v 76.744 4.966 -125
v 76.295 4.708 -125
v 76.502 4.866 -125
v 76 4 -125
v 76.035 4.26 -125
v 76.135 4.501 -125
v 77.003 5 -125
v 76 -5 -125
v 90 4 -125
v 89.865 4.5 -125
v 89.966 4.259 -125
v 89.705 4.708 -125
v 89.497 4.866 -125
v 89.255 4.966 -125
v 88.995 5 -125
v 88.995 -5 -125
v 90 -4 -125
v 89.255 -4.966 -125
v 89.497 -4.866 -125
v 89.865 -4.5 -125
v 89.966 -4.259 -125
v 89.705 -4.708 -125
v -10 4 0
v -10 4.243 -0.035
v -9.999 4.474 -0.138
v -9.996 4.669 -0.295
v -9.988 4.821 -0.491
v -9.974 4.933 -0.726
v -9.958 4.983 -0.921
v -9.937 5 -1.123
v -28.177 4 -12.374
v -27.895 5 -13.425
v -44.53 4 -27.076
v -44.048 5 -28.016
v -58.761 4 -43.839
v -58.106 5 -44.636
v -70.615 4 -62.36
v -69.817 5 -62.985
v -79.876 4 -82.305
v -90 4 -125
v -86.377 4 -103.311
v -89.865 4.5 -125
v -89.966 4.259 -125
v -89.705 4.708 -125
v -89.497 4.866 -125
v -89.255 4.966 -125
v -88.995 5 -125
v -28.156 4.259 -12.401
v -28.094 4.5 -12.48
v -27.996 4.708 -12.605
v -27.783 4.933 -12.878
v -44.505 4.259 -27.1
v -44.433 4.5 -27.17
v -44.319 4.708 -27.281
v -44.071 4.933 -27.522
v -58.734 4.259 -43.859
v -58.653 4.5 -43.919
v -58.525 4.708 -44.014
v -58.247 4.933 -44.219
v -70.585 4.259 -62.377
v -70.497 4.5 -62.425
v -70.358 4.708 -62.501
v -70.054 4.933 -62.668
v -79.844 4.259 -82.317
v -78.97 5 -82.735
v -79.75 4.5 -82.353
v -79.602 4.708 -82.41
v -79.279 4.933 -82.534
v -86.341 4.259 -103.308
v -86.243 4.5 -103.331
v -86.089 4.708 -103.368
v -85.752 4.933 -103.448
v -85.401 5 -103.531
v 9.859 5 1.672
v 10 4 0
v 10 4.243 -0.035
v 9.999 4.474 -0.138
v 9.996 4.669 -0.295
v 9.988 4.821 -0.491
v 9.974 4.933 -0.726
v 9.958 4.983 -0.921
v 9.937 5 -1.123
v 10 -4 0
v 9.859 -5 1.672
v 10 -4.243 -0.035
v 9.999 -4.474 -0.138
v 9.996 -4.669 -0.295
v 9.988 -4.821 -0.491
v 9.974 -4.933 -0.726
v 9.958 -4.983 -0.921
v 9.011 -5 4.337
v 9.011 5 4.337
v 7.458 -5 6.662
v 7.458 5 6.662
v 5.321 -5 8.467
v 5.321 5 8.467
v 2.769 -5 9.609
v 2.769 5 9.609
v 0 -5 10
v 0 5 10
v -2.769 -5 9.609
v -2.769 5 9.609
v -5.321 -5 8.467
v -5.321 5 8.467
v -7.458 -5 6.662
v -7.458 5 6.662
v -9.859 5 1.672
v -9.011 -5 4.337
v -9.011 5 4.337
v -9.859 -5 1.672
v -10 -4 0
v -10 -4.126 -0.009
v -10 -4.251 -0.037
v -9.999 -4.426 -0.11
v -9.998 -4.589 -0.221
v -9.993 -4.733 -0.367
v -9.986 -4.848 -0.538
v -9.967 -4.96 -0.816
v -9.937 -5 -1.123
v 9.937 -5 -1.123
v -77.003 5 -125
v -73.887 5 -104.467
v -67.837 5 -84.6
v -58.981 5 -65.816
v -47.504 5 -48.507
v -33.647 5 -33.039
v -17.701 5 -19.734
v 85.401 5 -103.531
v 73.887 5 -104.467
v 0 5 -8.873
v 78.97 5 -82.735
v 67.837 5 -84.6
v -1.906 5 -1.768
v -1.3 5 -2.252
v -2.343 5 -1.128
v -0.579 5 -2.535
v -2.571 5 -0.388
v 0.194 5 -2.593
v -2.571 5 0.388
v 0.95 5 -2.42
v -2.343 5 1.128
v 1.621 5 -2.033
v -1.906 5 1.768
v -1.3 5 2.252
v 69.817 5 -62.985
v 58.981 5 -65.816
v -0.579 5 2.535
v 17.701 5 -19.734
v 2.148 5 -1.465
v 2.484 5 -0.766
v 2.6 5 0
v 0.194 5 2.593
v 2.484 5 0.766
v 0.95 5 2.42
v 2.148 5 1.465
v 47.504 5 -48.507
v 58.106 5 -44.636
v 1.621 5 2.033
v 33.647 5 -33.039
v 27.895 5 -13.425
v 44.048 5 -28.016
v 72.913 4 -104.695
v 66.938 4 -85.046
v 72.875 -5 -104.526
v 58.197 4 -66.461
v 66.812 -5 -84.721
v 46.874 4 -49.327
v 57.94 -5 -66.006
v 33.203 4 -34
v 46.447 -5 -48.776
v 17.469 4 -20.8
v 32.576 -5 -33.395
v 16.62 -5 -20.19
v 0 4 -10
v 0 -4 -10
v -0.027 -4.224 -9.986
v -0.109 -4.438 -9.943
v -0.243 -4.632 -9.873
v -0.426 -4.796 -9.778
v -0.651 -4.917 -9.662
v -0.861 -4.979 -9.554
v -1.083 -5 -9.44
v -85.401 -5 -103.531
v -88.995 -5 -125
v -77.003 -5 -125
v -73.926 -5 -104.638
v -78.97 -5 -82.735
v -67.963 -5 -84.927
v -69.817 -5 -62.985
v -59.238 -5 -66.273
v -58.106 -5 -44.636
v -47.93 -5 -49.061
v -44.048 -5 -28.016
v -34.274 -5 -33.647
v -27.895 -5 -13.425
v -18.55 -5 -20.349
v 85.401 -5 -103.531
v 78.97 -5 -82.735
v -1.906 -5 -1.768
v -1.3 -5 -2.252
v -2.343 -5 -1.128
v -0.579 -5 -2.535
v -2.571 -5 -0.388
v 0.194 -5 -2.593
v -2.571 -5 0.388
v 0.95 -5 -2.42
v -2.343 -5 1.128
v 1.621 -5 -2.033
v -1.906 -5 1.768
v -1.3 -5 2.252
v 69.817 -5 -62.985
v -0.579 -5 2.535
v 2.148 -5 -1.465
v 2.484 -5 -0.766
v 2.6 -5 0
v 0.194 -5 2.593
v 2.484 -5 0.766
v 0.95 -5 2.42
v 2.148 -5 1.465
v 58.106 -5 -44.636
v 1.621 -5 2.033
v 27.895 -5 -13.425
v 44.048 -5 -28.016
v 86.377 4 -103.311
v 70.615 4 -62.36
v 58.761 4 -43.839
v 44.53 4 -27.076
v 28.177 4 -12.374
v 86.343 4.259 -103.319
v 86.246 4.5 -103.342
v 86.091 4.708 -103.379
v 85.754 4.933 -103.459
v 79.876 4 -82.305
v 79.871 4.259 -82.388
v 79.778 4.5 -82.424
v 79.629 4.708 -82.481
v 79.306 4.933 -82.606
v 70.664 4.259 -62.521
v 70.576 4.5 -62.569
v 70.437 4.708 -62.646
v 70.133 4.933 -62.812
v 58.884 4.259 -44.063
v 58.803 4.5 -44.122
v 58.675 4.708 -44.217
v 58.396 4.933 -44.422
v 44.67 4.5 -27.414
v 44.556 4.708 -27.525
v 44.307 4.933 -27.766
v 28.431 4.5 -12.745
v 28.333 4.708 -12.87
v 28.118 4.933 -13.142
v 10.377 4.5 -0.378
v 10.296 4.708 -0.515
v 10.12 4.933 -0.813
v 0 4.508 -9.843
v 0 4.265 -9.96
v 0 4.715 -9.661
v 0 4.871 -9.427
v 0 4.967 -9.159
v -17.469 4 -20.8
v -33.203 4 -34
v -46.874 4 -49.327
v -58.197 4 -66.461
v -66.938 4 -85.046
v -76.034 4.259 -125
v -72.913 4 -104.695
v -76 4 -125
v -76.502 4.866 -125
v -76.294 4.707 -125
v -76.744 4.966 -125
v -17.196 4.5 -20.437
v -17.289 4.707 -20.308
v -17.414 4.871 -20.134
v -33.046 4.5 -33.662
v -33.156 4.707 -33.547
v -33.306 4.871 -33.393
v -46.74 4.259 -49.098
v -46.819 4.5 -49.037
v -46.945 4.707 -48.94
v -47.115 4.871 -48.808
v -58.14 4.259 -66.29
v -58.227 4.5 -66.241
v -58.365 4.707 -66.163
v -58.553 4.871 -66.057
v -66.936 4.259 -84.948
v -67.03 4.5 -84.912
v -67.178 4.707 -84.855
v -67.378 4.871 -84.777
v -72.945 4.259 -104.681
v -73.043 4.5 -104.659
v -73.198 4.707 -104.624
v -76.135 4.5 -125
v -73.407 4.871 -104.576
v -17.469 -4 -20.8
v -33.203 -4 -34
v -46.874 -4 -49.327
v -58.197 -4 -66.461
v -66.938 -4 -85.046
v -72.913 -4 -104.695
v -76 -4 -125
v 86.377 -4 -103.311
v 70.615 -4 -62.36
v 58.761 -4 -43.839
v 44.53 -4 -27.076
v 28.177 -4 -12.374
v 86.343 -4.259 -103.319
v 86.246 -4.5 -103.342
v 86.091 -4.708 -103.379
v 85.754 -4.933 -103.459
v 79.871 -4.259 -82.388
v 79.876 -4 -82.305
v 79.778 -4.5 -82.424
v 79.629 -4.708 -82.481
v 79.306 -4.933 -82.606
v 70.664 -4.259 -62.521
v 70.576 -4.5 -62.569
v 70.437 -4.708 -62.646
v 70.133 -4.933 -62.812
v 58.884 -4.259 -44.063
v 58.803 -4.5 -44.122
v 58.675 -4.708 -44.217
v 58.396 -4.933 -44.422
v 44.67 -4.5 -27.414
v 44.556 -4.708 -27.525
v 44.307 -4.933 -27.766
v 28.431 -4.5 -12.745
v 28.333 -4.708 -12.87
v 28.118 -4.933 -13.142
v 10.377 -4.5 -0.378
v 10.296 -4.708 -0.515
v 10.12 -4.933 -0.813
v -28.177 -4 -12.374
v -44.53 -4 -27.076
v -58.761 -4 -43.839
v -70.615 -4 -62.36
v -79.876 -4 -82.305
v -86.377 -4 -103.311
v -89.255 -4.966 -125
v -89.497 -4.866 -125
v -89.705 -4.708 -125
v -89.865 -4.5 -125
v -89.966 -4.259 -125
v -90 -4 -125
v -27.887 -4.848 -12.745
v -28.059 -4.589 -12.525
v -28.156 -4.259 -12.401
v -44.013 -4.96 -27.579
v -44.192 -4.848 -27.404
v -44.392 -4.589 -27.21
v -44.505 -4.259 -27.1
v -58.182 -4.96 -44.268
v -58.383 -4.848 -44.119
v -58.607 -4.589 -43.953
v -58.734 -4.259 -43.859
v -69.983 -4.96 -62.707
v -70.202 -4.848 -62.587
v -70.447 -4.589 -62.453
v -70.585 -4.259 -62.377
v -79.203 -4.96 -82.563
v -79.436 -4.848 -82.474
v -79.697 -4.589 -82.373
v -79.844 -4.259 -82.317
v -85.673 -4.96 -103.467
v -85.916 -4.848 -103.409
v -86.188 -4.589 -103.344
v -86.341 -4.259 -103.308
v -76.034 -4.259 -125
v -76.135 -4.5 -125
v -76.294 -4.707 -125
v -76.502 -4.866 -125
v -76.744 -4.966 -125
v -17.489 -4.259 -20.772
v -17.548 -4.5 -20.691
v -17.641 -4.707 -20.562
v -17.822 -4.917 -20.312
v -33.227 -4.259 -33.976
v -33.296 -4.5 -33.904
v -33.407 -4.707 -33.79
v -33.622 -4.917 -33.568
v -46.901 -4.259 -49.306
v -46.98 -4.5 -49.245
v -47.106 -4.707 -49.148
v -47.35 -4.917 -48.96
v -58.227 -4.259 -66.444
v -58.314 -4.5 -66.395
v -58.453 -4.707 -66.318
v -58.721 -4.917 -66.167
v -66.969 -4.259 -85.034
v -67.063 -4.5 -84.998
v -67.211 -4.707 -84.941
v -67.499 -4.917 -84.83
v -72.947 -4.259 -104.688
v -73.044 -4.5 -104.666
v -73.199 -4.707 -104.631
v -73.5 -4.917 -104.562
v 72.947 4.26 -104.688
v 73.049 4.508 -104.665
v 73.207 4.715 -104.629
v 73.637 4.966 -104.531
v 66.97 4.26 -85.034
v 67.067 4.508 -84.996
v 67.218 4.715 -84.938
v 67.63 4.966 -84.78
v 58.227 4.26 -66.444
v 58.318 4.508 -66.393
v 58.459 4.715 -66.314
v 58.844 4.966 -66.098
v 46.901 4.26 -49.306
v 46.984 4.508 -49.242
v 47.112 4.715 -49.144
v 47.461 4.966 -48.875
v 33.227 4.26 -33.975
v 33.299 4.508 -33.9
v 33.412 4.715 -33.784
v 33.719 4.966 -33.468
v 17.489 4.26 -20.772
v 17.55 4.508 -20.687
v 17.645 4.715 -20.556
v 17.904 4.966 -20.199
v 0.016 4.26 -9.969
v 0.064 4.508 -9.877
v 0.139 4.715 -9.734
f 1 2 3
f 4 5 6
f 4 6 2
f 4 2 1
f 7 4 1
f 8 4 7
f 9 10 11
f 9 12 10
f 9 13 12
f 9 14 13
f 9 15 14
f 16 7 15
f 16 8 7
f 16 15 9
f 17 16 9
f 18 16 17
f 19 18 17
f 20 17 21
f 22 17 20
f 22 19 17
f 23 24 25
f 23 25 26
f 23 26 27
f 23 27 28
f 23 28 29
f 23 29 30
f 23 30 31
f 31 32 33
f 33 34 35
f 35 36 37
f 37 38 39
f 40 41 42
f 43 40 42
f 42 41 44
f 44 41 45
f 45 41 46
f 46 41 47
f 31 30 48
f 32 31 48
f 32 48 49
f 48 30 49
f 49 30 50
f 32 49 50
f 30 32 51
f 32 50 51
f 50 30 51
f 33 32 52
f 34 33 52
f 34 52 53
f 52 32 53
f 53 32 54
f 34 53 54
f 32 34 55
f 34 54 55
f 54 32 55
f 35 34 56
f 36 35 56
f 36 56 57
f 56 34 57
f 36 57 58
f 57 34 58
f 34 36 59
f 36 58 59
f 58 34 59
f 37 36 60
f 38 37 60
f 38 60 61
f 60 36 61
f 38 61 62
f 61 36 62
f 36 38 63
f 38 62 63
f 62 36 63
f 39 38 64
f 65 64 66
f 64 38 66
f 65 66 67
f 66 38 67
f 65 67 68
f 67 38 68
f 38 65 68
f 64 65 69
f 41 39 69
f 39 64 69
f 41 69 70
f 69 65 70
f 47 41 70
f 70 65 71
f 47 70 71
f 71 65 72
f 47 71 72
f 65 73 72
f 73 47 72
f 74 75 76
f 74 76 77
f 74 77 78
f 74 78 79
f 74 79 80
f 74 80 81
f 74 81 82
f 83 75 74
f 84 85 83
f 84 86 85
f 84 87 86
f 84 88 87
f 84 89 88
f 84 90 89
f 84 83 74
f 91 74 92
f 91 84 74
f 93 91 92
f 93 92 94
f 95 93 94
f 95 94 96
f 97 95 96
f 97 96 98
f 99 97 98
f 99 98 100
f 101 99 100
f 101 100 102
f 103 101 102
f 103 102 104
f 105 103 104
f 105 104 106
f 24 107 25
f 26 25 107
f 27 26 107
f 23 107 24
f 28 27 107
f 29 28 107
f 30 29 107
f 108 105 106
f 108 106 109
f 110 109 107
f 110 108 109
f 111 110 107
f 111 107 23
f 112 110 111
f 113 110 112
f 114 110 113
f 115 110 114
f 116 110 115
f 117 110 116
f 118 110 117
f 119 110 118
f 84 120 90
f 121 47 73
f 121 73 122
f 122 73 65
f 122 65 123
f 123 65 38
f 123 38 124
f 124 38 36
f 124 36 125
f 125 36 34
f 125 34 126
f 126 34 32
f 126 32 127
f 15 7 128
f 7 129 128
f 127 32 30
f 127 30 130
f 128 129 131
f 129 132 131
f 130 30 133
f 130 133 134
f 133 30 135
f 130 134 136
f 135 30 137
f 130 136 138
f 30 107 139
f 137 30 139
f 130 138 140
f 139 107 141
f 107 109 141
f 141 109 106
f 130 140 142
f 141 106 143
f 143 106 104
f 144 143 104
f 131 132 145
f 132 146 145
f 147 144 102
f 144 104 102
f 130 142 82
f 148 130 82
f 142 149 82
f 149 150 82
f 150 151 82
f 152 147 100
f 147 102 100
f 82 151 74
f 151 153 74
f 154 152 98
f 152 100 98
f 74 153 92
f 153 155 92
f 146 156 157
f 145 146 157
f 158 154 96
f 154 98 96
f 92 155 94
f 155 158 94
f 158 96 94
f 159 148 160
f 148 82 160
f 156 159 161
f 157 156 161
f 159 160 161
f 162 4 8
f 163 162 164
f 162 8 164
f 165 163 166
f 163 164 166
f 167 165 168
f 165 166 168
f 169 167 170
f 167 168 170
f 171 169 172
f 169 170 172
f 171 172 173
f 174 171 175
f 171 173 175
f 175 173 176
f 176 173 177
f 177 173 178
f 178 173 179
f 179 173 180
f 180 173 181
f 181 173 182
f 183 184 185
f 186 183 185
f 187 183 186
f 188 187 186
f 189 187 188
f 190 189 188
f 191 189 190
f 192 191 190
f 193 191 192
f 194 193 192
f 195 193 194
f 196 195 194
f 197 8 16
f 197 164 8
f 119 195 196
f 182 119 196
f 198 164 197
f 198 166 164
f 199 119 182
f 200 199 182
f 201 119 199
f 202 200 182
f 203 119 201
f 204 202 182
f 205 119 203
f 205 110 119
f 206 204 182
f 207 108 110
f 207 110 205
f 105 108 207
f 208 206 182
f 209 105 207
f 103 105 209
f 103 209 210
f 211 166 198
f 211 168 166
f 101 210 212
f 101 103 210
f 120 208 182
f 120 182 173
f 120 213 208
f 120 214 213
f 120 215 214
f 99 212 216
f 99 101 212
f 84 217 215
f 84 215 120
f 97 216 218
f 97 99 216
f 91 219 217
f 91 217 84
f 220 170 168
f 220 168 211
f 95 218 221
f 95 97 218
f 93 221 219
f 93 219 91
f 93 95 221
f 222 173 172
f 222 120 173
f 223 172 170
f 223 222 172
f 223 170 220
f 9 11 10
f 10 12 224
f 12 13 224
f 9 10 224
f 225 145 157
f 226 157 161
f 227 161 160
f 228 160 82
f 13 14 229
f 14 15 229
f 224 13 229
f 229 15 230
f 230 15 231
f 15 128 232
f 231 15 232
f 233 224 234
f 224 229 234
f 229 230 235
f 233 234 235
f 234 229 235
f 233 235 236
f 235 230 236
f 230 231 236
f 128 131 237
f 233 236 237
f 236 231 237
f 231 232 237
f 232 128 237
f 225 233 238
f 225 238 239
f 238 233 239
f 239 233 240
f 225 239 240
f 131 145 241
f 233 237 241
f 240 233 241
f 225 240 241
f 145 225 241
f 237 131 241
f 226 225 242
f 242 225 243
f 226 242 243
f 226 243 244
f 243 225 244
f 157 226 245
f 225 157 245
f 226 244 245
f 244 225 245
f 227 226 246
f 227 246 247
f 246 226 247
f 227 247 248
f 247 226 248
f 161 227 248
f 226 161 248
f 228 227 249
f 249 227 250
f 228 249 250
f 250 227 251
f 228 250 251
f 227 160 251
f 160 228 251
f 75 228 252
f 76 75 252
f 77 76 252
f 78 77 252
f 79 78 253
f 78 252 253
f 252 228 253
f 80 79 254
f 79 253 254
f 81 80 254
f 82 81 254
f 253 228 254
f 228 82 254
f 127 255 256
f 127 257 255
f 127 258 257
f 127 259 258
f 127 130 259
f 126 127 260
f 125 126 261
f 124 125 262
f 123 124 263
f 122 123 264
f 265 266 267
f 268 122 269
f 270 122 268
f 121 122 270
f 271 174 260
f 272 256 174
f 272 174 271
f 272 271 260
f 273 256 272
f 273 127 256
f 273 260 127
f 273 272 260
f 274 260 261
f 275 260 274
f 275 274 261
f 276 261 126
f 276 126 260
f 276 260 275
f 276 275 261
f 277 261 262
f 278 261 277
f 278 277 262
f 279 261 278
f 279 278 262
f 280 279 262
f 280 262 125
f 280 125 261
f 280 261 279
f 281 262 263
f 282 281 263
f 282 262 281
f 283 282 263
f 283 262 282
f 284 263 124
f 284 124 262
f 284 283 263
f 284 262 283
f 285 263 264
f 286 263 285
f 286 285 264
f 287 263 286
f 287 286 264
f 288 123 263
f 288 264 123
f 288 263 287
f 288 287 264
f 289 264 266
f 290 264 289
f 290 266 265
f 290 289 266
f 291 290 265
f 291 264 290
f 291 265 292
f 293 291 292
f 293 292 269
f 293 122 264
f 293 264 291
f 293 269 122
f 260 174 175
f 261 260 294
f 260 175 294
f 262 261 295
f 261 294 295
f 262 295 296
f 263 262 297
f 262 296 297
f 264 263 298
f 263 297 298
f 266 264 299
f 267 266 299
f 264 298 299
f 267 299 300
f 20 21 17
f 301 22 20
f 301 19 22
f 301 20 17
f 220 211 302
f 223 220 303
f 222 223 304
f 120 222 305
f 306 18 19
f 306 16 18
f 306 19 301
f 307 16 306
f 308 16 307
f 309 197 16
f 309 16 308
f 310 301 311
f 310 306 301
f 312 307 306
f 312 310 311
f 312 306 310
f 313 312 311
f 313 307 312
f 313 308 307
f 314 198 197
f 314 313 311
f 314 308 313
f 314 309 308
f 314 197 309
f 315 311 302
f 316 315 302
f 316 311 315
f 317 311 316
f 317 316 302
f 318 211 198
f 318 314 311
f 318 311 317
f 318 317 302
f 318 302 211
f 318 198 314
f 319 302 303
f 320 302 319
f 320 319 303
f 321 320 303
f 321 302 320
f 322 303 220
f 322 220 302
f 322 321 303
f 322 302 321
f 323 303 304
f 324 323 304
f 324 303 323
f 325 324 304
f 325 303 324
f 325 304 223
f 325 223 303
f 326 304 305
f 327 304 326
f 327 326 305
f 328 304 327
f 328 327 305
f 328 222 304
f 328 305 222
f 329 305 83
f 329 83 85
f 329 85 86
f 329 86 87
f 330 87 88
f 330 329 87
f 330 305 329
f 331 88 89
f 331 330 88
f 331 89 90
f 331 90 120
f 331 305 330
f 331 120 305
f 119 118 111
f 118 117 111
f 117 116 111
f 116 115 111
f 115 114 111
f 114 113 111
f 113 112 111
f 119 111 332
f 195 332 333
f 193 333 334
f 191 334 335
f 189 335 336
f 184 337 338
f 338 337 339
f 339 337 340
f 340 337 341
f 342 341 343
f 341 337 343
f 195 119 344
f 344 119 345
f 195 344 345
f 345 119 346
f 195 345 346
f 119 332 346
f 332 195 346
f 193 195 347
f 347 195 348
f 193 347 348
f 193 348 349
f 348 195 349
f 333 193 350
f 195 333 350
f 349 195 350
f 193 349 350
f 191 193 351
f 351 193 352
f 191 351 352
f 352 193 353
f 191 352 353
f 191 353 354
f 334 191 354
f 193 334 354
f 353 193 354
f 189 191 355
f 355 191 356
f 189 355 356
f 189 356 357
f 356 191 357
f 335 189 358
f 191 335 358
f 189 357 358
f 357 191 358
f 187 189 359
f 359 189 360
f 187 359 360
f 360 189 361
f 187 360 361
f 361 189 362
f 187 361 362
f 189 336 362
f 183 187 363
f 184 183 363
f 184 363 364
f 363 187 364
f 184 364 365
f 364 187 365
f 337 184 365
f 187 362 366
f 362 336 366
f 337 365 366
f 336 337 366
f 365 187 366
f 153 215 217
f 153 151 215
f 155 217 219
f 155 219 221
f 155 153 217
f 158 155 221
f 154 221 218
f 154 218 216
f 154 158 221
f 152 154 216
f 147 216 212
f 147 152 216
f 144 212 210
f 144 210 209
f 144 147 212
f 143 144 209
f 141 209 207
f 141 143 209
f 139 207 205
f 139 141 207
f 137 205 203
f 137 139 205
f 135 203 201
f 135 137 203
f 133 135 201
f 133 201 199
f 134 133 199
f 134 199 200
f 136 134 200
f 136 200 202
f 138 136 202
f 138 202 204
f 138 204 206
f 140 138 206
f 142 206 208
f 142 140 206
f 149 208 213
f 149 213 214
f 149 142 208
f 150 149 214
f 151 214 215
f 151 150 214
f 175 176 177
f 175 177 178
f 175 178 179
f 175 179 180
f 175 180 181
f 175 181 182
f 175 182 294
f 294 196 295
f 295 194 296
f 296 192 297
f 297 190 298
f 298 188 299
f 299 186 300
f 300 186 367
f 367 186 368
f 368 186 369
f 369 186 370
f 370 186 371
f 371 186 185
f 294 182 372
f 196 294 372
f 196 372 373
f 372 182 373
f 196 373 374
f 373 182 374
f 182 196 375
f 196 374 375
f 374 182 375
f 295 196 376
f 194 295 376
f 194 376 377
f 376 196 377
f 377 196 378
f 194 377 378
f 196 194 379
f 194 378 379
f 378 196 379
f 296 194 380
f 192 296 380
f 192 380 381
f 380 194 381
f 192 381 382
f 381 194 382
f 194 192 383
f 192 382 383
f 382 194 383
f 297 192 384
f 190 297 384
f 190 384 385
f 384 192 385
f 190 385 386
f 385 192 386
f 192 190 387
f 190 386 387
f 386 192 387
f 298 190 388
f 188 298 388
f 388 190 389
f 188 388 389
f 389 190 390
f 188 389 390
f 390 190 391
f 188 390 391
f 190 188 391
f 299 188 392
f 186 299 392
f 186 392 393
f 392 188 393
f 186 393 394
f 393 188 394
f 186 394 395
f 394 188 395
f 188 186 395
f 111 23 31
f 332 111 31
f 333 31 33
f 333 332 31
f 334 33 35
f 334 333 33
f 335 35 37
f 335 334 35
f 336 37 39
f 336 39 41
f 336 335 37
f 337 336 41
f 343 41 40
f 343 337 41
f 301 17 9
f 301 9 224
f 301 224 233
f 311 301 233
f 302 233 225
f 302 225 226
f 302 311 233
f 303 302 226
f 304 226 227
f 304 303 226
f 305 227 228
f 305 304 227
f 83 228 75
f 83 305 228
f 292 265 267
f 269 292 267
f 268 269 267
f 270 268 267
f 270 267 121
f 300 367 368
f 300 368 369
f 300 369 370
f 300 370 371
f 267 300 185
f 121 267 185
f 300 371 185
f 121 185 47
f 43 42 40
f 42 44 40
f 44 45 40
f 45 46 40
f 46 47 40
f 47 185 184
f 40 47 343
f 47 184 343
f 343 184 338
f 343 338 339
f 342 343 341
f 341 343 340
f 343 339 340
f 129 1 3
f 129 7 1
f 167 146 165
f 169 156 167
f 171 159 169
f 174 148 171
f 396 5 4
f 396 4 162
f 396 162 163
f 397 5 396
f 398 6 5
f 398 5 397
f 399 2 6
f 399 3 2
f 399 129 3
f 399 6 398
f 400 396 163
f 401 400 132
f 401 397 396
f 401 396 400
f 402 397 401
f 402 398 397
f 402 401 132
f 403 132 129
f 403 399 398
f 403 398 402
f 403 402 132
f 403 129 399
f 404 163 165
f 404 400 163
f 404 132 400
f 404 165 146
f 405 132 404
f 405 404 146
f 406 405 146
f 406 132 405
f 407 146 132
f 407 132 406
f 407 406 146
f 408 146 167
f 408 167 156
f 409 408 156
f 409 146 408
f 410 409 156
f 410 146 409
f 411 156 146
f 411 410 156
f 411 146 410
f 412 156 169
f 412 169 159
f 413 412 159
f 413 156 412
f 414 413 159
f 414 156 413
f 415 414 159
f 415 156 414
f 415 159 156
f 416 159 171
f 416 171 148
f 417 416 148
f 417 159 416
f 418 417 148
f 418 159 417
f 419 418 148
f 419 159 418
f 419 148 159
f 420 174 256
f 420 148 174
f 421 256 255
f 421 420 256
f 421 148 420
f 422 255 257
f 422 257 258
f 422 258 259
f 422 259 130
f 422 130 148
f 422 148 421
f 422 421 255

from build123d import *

# Parameters (mm, degrees)
SKETCH_R      = 2.6
EXTRUDE_DEPTH = 5
FILLET_R      = 1


with BuildPart() as part:
    # Sketch → Extrude (new body, symmetric)
    with BuildSketch(Plane.XZ):
        with BuildLine():
            ThreePointArc((10, 0), (0, 10), (-10, 0))
            ThreePointArc((-10, 0), (-64.999628, -52.900238), (-90, -125))
            Line((-76, -125), (-90, -125))
            ThreePointArc((0, -10), (-52.844624, -57.68964), (-76, -125))
            ThreePointArc((76, -125), (52.844624, -57.68964), (0, -10))
            Line((76, -125), (90, -125))
            ThreePointArc((90, -125), (64.999628, -52.900238), (10, 0))
        make_face()
        Circle(SKETCH_R, mode=Mode.SUBTRACT)
    extrude(amount=EXTRUDE_DEPTH, both=True)

    # Fillet
    fillet_edges = [part.edges().sort_by_distance(p)[0] for p in [
        (64.999628, 5, -52.900238),
        (64.999628, -5, -52.900238),
        (-64.999628, 5, -52.900238),
        (-64.999628, -5, -52.900238),
        (-52.844624, 5, -57.68964),
        (-52.844624, -5, -57.68964),
        (52.844624, 5, -57.68964),
    ]]
    fillet(fillet_edges, radius=FILLET_R)


solid = part.part
